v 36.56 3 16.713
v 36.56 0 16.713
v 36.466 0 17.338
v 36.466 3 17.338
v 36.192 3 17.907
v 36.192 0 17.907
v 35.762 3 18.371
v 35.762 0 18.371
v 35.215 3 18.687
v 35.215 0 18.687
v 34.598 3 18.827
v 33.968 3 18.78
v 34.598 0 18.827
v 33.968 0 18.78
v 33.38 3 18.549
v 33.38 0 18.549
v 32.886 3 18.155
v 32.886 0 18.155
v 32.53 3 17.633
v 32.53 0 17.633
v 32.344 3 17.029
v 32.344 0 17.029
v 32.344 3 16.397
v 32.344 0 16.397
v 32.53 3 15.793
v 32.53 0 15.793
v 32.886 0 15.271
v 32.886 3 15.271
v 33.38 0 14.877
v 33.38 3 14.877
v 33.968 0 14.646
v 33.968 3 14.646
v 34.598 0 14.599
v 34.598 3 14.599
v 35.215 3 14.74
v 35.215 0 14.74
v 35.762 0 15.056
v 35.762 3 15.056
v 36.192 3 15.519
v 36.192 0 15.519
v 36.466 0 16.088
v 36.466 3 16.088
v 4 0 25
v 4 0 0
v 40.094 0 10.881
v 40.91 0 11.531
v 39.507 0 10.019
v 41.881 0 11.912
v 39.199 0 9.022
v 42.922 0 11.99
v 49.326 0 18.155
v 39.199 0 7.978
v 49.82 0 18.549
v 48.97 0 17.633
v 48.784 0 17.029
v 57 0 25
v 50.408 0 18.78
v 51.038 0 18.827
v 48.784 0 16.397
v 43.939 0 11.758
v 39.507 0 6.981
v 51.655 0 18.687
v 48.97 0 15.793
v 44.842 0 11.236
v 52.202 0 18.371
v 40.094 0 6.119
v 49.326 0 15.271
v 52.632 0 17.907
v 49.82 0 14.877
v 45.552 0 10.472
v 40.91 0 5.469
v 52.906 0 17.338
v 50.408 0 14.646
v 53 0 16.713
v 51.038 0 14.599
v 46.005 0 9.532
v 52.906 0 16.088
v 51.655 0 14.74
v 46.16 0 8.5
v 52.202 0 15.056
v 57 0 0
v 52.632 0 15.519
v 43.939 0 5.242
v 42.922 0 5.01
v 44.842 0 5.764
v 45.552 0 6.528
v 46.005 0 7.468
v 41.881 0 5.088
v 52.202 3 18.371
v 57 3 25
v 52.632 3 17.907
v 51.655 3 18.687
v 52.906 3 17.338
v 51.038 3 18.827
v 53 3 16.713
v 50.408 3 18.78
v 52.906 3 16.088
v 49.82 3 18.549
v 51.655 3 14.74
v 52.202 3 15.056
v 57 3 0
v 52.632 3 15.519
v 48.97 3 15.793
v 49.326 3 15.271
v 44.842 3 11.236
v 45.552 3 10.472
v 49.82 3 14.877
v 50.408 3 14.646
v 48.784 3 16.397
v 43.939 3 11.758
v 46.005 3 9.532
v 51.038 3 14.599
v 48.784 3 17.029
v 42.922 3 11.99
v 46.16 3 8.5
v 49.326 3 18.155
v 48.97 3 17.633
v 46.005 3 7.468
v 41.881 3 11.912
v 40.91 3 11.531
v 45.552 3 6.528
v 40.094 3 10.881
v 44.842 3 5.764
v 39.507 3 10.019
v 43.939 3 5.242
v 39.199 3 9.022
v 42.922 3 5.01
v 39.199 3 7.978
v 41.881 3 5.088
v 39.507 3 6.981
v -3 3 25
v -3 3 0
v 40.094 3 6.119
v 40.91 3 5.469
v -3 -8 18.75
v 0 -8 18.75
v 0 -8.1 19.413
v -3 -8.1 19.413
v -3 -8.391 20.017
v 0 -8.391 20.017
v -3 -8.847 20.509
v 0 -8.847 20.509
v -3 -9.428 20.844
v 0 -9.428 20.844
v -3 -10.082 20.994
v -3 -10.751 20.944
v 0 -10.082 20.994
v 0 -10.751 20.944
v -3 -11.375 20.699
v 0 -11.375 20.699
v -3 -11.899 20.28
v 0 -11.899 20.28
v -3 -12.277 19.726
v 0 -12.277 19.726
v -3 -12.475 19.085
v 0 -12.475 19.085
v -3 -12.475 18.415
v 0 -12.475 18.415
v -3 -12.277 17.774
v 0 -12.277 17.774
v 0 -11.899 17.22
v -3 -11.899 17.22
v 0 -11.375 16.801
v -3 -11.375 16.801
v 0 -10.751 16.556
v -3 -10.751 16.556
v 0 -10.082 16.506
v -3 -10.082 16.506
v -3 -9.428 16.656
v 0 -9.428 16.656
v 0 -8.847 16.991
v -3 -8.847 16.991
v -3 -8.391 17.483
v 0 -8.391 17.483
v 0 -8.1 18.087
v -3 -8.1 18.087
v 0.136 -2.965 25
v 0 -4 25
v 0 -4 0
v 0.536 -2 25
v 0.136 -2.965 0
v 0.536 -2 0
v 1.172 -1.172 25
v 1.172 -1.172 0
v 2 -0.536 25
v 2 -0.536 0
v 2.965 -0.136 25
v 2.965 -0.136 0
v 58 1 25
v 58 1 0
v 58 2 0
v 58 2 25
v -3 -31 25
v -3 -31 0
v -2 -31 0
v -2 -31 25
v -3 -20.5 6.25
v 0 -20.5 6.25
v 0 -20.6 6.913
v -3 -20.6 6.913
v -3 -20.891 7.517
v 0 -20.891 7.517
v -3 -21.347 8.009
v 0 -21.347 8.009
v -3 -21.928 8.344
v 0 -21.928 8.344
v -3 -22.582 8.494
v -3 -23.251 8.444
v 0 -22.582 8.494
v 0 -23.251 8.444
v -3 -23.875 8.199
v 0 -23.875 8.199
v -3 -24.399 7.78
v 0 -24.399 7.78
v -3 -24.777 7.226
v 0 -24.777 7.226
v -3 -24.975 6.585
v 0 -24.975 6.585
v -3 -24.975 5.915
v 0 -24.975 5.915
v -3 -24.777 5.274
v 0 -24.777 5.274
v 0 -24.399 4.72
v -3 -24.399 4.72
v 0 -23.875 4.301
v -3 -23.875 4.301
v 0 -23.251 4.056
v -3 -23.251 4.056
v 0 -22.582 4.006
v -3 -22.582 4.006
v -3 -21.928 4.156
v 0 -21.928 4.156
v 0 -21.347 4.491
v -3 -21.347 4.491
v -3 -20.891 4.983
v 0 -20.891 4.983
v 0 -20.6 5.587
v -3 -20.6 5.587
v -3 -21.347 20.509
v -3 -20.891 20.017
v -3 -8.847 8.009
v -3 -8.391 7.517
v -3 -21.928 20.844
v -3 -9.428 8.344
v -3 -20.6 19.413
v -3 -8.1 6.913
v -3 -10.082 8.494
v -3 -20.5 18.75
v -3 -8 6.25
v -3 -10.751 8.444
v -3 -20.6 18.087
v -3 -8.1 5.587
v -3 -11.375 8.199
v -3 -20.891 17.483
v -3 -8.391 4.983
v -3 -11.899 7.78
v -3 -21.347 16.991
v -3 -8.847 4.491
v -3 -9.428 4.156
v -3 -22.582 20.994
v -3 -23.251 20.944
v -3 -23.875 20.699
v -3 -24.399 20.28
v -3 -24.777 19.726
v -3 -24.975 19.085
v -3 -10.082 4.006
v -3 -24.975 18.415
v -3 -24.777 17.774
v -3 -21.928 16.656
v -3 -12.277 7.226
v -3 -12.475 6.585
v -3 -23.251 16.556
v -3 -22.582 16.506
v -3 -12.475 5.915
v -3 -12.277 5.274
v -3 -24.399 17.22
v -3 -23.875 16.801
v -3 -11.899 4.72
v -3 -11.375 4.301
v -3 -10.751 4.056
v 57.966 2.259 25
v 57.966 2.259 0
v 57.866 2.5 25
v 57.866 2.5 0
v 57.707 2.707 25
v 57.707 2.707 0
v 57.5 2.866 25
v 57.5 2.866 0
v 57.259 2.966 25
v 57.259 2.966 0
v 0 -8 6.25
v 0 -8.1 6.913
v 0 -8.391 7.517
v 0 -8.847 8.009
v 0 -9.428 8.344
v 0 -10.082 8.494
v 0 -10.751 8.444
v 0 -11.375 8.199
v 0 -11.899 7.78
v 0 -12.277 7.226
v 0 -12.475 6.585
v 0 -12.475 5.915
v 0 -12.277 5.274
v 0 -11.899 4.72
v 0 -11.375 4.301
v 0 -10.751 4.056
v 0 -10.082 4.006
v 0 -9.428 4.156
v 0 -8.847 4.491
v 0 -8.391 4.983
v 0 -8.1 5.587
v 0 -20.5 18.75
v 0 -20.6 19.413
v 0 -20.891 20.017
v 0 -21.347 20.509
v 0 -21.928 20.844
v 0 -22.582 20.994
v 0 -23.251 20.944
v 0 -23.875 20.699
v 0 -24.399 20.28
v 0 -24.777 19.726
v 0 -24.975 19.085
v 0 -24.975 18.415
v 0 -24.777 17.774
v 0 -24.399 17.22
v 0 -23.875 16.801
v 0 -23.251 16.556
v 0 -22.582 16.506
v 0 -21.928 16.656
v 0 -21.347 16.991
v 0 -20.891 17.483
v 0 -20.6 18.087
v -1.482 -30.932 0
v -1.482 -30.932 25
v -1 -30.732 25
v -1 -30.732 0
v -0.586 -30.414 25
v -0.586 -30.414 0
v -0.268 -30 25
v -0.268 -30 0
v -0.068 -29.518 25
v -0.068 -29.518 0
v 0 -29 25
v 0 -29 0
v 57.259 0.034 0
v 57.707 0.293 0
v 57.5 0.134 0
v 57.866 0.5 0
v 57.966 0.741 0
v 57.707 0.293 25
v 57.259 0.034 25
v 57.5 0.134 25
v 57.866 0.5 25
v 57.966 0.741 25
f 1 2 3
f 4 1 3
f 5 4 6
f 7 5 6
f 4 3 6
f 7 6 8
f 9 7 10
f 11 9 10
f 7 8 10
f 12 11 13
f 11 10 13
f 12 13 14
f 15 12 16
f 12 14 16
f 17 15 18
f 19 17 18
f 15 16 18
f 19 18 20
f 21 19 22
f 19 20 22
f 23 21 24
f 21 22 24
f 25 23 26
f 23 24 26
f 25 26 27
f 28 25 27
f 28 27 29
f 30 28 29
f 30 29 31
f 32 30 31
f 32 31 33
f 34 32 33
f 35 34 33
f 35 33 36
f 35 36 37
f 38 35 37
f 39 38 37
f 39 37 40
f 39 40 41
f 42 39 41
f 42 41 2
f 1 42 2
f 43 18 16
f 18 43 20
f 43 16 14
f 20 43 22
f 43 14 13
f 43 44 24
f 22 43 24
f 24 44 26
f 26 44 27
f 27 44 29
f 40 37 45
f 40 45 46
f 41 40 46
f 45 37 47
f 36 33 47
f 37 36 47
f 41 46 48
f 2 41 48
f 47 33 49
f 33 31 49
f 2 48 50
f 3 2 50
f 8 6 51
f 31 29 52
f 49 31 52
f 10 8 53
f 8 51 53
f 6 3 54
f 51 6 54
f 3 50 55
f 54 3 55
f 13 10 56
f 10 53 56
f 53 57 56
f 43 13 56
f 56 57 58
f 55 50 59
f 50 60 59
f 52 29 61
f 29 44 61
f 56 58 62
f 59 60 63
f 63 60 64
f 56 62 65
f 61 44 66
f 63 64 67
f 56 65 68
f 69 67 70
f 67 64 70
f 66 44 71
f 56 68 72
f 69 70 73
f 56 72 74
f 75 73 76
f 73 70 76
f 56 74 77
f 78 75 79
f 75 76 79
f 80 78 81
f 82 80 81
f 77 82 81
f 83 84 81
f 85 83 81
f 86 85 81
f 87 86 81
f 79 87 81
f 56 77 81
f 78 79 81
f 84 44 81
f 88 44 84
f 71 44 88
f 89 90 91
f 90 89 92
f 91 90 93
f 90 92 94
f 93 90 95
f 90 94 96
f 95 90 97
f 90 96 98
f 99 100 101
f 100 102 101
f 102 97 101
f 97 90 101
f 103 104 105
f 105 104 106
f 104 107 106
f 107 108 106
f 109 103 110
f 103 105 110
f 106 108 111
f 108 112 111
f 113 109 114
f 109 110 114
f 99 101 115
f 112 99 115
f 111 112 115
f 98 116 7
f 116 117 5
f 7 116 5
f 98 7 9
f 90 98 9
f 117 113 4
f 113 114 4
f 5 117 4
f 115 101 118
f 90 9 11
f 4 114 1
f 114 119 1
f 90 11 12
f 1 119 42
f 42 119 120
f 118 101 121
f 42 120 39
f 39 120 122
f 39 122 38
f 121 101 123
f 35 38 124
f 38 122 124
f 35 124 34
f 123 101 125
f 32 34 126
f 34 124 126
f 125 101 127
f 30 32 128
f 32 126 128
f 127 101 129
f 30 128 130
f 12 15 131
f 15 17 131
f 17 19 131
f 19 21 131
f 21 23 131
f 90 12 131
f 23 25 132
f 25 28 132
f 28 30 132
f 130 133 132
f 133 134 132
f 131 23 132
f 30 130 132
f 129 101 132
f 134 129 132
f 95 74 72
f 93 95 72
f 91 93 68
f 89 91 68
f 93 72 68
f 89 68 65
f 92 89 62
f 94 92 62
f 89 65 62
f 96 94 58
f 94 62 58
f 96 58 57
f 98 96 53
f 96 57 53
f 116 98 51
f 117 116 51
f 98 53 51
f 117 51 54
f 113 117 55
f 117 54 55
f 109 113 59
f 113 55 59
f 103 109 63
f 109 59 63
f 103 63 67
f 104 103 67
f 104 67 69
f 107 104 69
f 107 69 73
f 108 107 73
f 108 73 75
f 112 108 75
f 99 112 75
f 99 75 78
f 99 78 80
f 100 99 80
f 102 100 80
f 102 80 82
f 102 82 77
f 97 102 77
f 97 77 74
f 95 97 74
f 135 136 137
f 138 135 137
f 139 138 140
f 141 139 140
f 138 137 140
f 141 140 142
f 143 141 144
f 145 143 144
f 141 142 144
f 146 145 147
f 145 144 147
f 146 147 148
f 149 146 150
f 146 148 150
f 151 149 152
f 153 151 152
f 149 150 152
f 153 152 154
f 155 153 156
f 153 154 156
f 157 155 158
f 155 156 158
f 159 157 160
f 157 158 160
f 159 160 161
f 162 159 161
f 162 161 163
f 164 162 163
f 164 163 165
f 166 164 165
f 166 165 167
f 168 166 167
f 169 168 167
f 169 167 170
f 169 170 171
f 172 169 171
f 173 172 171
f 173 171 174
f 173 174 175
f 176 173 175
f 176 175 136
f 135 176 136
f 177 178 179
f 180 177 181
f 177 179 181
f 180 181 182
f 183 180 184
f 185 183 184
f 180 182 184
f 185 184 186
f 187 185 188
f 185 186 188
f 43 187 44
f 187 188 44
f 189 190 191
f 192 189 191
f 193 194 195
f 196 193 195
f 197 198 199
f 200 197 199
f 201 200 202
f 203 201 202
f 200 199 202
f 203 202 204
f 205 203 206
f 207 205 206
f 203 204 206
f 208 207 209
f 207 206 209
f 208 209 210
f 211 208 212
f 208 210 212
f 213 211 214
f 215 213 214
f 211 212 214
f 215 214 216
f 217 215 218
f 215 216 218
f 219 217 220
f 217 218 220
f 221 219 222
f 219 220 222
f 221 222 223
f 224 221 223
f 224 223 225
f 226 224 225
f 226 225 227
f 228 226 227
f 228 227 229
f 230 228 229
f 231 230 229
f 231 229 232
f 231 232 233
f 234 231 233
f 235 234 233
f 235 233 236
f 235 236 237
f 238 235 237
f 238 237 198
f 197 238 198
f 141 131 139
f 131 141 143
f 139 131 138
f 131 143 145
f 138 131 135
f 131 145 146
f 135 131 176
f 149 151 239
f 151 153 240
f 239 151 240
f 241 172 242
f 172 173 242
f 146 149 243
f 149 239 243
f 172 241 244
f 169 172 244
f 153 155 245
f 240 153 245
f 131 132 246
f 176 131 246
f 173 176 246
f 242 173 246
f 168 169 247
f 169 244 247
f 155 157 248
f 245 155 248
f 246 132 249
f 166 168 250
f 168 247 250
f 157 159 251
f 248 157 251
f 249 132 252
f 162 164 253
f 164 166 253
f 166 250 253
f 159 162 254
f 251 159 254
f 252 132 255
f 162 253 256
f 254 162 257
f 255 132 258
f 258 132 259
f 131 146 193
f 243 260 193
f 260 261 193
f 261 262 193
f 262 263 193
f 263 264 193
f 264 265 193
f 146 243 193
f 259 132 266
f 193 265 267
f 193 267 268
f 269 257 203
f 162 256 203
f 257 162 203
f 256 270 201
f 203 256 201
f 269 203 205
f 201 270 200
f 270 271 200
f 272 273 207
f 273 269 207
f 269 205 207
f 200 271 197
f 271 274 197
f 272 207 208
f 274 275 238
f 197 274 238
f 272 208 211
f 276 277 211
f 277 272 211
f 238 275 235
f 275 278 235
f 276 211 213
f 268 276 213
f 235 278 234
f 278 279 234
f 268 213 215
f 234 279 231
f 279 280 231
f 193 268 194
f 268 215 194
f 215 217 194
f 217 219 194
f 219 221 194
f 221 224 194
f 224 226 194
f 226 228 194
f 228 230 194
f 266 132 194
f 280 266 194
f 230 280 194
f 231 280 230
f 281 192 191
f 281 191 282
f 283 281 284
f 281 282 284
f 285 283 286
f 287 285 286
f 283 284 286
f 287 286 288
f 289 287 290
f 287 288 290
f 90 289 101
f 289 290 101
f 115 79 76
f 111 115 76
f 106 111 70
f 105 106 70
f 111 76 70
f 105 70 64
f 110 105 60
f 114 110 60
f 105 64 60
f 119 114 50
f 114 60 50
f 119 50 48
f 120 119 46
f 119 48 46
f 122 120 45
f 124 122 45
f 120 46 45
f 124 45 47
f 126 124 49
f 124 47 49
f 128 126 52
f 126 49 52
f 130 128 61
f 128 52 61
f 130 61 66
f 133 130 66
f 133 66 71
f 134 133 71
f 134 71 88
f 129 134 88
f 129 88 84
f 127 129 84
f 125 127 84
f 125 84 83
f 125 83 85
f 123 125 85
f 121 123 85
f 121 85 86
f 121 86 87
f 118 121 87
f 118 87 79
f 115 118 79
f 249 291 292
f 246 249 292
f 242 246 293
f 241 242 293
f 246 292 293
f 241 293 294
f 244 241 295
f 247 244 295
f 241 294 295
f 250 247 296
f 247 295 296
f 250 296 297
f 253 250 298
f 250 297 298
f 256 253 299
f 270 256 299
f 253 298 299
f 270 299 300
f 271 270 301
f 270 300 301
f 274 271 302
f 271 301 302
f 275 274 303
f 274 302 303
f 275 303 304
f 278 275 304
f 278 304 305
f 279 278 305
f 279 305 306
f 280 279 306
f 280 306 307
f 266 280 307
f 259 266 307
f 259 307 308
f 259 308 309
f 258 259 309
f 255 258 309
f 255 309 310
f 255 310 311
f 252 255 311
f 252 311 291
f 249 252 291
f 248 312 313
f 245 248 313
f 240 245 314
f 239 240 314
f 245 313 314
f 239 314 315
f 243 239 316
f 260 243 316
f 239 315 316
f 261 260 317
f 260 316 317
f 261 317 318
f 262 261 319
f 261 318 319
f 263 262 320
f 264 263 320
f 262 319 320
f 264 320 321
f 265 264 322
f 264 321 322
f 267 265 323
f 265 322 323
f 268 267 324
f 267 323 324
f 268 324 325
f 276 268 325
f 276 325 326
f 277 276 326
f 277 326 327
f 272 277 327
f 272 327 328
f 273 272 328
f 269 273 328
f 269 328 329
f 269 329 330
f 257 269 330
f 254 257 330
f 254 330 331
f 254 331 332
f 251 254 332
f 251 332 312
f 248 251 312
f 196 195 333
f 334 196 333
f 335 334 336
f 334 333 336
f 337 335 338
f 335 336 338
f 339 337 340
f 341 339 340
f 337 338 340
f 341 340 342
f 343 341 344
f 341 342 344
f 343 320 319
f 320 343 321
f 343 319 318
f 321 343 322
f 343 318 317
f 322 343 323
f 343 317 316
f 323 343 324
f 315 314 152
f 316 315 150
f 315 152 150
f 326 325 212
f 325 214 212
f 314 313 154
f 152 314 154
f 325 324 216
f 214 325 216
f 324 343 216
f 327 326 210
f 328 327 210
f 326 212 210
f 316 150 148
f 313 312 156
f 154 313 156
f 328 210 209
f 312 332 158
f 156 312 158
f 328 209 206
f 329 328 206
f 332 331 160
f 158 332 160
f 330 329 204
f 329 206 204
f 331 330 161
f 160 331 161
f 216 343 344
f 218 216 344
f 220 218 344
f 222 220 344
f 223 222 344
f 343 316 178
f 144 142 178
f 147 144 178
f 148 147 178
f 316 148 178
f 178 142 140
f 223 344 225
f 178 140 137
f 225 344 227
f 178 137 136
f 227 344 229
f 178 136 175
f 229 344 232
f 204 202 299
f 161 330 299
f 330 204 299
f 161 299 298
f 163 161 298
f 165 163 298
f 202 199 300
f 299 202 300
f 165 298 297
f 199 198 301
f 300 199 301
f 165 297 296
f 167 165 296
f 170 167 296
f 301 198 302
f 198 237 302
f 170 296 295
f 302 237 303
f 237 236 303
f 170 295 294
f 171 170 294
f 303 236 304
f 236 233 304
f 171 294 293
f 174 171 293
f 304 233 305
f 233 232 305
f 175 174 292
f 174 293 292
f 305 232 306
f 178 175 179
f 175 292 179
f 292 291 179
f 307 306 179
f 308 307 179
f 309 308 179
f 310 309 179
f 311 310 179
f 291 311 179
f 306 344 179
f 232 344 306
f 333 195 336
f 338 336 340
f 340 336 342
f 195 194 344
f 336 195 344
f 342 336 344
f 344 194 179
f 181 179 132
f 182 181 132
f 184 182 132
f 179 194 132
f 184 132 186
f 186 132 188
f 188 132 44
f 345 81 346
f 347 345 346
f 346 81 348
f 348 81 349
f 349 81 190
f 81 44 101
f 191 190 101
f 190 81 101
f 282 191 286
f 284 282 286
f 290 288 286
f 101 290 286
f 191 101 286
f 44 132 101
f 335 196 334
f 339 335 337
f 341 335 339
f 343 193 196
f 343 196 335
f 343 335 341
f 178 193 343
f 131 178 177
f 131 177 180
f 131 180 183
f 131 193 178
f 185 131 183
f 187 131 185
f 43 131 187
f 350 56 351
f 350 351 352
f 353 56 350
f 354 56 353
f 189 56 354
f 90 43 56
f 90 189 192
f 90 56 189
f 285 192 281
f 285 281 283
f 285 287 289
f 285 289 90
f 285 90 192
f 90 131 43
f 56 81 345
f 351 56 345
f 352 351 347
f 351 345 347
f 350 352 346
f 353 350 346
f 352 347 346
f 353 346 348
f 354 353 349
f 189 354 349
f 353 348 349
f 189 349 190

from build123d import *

# Parameters (mm, degrees)
F1_DEPTH = 25
F2_R     = 2.25
F3_DEPTH = 25
F4_R     = 3.5
F4_R_2   = 2.12
F5_DEPTH = 25


with BuildPart() as f1:
    # F0 (on Top) → F1 (new body)
    with BuildSketch(Plane.XY):
        with BuildLine():
            ThreePointArc((-2, -31), (-0.585786, -30.414214), (0, -29))
            Line((0, -29), (0, -4))
            ThreePointArc((0, -4), (1.171573, -1.171573), (4, 0))
            Line((4, 0), (57, 0))
            ThreePointArc((57, 0), (57.707107, 0.292893), (58, 1))
            Line((58, 1), (58, 2))
            ThreePointArc((58, 2), (57.707107, 2.707107), (57, 3))
            Line((57, 3), (-3, 3))
            Line((-3, 3), (-3, -31))
            Line((-3, -31), (-2, -31))
        make_face()
    extrude(amount=F1_DEPTH)

    # F2 (on face) → F3 (cut)
    with BuildSketch(Plane.YZ):
        with Locations((-22.75, 18.75)):
            Circle(F2_R)
        with Locations((-10.25, 18.75)):
            Circle(F2_R)
        with Locations((-10.25, 6.25)):
            Circle(F2_R)
        with Locations((-22.75, 6.25)):
            Circle(F2_R)
    extrude(amount=-F3_DEPTH, mode=Mode.SUBTRACT)

    # F4 (on face) → F5 (cut)
    with BuildSketch(Plane.XZ):
        with Locations((42.66, 8.5)):
            Circle(F4_R)
        with Locations((50.88, 16.71316)):
            Circle(F4_R_2)
        with Locations((34.44, 16.71316)):
            Circle(F4_R_2)
    extrude(amount=-F5_DEPTH, mode=Mode.SUBTRACT)


solid = f1.part
